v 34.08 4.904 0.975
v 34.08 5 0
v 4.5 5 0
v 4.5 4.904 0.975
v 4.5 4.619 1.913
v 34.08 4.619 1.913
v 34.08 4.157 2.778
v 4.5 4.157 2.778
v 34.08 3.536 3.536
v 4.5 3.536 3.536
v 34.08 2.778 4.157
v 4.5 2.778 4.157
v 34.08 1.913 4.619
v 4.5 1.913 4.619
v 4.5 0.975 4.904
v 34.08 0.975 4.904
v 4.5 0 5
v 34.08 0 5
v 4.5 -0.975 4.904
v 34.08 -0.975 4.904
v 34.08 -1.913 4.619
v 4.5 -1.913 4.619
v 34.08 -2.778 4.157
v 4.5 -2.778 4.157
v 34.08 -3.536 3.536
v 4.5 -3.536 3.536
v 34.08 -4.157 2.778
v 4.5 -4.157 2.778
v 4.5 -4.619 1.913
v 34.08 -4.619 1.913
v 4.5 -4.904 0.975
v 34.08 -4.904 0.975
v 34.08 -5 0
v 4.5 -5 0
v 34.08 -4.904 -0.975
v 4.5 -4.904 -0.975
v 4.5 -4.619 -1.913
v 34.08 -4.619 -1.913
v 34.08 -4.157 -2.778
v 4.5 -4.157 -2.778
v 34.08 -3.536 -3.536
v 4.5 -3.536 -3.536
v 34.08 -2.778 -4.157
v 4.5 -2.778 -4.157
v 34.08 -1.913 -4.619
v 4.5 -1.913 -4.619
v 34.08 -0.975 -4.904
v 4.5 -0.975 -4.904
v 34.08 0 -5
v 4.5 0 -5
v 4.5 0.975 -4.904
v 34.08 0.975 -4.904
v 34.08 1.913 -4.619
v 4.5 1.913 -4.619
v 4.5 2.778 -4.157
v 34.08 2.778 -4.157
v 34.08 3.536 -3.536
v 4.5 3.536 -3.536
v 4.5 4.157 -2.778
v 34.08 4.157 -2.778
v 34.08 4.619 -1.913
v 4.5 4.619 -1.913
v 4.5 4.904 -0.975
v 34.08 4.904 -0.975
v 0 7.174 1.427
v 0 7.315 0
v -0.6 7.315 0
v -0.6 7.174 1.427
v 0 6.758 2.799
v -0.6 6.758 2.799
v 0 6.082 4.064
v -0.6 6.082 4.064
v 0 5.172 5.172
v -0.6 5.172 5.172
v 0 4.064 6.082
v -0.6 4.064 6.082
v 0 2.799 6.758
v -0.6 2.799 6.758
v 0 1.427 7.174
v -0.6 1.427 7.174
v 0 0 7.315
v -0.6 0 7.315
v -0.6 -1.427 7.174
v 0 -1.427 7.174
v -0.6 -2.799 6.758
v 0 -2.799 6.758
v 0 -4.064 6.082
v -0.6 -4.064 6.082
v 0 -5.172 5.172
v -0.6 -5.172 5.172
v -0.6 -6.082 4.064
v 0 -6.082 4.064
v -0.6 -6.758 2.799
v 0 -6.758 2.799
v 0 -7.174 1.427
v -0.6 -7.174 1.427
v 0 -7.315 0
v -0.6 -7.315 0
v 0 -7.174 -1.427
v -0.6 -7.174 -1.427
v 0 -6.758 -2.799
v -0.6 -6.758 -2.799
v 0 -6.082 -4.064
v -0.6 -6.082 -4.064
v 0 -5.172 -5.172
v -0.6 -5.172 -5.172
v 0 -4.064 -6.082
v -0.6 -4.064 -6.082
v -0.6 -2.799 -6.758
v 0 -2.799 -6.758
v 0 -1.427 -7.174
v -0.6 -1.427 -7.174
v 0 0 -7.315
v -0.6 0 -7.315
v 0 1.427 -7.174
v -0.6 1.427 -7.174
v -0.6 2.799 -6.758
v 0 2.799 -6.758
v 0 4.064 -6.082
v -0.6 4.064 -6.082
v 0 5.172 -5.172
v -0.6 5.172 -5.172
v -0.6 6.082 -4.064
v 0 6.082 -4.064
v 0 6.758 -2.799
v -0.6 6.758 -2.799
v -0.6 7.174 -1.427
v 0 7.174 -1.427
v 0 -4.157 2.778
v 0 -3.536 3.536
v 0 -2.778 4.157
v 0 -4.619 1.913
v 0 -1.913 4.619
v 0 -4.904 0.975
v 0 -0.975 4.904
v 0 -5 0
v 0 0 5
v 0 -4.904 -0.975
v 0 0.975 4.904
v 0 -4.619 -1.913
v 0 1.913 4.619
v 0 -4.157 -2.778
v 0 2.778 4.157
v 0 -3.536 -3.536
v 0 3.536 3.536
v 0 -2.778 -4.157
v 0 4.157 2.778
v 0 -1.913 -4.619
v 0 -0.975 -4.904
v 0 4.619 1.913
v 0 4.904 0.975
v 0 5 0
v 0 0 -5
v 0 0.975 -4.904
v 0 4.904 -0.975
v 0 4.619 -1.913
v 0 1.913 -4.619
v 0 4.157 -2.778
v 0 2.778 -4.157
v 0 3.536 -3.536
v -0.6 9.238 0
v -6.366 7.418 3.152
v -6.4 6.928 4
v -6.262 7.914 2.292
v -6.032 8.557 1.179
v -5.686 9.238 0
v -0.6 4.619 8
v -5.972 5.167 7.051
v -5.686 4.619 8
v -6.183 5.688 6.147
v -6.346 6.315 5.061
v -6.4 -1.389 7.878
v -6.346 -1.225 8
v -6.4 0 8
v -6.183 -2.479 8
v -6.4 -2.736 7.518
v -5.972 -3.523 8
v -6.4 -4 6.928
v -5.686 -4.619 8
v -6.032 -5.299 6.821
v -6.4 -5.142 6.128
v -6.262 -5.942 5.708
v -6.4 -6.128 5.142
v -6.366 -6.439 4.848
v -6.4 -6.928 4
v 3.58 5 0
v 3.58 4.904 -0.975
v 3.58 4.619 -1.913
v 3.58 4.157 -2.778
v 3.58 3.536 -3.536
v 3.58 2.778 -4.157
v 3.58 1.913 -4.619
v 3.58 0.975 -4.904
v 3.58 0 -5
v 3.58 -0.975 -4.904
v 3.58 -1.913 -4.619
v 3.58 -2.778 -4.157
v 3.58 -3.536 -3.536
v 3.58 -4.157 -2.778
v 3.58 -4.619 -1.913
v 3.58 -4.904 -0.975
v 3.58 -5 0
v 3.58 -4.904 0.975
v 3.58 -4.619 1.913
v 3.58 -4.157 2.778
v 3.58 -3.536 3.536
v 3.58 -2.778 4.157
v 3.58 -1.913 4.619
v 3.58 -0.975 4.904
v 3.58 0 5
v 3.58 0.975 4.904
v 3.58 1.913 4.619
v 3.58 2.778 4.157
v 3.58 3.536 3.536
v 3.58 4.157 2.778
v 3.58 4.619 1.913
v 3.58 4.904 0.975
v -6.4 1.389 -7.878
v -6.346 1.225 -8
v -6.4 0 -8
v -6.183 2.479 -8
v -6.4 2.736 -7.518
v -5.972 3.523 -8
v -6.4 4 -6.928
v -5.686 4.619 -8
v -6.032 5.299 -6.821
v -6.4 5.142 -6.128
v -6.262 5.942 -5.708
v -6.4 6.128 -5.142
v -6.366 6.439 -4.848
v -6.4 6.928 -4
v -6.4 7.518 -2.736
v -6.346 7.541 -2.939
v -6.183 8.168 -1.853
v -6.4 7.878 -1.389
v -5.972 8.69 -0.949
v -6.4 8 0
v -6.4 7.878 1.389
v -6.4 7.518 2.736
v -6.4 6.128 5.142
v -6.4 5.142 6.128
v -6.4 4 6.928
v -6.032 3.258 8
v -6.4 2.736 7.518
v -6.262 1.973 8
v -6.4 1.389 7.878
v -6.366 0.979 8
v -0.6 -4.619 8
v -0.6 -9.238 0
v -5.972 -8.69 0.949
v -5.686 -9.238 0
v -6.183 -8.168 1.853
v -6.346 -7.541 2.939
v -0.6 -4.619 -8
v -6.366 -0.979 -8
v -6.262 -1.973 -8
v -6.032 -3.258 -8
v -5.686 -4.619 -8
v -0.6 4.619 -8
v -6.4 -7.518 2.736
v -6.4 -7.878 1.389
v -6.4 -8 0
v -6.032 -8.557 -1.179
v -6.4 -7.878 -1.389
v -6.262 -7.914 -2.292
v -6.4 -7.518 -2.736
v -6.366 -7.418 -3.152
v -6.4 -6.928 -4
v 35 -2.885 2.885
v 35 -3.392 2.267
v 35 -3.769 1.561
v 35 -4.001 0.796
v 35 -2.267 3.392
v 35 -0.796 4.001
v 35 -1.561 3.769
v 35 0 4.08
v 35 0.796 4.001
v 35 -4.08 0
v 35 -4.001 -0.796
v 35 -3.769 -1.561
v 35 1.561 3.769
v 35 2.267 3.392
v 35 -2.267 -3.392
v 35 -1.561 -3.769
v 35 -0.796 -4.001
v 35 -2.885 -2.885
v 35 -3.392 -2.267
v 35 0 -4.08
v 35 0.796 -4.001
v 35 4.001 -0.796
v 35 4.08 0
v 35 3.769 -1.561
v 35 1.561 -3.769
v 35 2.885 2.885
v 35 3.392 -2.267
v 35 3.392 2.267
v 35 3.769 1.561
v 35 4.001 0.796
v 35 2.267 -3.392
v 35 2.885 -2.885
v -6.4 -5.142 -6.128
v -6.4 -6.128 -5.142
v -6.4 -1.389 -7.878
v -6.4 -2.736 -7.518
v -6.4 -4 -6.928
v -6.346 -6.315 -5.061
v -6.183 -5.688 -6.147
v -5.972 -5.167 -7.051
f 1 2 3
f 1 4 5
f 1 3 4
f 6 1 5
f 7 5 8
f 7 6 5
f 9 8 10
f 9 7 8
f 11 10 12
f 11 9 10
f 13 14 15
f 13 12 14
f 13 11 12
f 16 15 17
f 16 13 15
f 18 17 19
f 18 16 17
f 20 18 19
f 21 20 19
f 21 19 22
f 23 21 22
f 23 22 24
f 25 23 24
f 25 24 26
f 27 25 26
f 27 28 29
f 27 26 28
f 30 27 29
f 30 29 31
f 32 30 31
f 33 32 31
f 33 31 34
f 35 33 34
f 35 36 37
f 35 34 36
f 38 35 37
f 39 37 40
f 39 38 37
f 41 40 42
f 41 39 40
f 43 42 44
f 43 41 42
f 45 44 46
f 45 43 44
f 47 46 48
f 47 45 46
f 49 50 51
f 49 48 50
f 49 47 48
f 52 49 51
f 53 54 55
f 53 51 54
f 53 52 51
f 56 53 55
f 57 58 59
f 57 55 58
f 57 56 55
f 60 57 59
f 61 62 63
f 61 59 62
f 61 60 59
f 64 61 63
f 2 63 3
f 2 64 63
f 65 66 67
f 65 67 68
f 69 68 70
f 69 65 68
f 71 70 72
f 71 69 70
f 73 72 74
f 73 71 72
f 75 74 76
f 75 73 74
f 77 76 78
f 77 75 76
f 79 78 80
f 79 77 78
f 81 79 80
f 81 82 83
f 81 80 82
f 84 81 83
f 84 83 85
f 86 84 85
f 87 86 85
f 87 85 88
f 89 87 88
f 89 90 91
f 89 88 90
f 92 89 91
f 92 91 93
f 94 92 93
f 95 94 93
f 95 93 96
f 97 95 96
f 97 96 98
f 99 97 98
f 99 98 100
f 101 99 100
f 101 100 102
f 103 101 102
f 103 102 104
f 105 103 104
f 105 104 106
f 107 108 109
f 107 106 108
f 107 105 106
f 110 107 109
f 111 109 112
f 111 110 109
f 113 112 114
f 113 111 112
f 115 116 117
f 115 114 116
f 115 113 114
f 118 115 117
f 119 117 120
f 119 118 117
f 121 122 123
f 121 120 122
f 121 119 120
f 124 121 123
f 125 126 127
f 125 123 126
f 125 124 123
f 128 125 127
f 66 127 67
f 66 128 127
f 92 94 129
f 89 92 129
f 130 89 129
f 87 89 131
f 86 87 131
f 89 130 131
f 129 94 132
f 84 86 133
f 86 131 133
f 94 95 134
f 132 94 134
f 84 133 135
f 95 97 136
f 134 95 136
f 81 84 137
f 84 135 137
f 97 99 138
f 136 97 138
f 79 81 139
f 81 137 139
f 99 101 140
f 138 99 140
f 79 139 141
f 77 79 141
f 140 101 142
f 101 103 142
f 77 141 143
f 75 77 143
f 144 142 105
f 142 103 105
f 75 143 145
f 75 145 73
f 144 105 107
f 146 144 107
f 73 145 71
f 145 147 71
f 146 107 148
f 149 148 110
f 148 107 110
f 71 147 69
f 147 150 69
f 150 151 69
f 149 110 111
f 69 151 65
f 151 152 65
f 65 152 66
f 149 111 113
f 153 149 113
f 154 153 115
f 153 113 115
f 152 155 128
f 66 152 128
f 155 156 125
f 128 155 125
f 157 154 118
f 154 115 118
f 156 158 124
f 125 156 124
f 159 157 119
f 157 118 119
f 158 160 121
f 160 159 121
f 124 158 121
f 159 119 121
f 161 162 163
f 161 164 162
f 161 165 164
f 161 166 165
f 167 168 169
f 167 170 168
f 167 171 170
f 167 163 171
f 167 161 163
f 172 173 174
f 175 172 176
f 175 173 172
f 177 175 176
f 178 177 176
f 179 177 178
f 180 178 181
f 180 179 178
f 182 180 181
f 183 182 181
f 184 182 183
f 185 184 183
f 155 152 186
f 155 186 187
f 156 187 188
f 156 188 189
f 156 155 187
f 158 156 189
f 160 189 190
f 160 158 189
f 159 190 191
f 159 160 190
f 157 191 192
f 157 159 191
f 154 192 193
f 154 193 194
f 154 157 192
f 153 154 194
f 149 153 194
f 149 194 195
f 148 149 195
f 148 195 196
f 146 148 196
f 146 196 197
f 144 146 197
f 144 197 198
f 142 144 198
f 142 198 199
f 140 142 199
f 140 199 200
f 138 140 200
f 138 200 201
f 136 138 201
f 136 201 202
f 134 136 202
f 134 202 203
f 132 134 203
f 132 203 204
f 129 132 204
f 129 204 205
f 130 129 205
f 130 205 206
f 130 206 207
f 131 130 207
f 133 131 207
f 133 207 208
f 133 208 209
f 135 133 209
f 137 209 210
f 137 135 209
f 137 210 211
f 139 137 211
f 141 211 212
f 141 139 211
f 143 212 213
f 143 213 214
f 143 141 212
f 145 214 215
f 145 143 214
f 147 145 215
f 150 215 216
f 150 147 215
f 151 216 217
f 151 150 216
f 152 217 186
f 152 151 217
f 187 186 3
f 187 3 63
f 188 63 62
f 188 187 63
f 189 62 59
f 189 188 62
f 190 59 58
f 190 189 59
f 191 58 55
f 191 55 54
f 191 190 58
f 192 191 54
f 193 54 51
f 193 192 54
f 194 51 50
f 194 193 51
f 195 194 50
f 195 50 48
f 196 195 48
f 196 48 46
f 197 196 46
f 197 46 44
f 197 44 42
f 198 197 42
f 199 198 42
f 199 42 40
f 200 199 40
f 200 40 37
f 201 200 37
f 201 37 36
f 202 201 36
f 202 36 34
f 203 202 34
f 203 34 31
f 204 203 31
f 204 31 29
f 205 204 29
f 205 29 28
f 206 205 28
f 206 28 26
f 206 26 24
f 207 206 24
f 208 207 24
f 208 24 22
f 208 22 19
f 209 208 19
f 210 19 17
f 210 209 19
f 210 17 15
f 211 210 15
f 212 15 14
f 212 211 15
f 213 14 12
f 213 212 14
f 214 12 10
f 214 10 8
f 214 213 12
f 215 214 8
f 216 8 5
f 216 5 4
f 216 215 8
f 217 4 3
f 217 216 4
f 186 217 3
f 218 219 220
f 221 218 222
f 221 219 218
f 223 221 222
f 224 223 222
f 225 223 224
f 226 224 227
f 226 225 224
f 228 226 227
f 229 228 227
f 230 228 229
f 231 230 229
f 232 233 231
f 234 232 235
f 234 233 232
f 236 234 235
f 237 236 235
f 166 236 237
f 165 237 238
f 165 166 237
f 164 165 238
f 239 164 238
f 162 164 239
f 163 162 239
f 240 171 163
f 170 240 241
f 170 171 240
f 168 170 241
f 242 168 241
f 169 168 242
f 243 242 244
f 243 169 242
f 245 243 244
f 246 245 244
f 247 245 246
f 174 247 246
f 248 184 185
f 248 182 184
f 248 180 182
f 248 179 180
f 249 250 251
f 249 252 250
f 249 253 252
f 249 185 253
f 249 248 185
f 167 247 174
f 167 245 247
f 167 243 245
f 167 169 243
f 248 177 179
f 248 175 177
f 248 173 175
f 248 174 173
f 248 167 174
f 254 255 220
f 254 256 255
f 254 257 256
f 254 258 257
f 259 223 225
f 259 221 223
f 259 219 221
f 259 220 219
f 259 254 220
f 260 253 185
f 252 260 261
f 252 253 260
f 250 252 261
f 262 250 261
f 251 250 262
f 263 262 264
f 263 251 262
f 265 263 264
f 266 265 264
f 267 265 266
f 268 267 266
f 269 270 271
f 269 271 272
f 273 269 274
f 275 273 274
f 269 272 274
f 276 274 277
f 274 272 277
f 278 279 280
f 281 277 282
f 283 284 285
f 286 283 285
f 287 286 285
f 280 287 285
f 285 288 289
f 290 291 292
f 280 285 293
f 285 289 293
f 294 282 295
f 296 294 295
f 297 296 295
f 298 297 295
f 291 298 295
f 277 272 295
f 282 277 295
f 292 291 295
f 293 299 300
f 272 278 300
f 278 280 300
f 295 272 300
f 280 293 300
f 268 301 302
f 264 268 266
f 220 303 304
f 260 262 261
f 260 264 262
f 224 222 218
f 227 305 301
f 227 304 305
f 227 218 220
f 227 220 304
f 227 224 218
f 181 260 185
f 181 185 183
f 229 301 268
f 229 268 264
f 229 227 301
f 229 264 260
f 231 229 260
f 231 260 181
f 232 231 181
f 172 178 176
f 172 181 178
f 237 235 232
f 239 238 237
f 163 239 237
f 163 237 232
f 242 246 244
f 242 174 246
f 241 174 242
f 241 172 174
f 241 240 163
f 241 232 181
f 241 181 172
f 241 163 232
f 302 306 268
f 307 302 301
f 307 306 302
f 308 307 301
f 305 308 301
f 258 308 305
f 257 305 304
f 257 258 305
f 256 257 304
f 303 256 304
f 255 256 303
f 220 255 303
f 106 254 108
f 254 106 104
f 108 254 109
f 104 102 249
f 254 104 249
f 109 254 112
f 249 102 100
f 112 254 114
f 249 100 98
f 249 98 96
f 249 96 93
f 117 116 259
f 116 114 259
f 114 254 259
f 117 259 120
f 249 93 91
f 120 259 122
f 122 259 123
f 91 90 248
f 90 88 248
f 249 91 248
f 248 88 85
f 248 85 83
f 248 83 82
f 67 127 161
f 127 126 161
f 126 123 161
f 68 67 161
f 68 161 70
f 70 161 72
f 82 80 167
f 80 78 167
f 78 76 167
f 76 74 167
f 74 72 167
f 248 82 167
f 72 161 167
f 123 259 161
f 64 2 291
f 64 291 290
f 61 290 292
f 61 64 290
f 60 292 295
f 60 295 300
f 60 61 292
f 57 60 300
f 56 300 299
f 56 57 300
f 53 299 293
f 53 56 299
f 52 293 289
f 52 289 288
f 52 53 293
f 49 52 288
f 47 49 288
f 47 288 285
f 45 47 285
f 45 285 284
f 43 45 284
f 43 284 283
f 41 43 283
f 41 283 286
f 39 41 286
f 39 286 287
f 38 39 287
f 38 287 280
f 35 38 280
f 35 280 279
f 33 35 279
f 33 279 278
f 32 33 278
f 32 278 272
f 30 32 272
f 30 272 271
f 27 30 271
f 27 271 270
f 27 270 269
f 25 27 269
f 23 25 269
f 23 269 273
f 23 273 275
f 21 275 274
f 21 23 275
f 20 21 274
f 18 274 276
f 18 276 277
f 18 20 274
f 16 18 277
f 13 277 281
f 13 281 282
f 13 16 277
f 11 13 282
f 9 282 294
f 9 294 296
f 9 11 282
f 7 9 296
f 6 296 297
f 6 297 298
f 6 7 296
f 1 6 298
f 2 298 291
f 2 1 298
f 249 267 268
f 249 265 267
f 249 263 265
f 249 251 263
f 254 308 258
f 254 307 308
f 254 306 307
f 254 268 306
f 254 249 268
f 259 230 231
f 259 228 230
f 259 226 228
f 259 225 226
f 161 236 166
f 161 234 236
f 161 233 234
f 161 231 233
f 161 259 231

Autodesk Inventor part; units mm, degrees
ref_plane "YZ Plane" through (0, 0, 0) normal (1, 0, 0) x (0, 1, 0)
ref_plane "XZ Plane" through (0, 0, 0) normal (0, 1, 0) x (-1, 0, 0)
sketch "Sketch1" plane through (0, 0, 0) normal (0, 0, 1) x (1, 0, 0)
  line L0 (0, 7.315) -> (0, 5)
  line L1 (4.5, 5) -> (35, 5)
  line L2 (35, 5) -> (35, 0)
  line L3 (35, 0) -> (-0.6001, 0)
  line L4 (-7.7201, 0) -> (42.12, 0) projected
  line L5 (-0.6001, 0) -> (-0.6001, 7.315)
  line L6 (-0.6001, 7.315) -> (0, 7.315)
  line L7 (4.5, 5) -> (3.5797, 5)
  line L8 (3.5797, 5) -> (0, 5)
  line L9 (0, -1.463) -> (0, 8.778) projected
  dimension "d0" = 35
  dimension "d1" = 30.5
  dimension "d2" = 10
  dimension "d9" = 0.6001
  dimension "d10" = 14.63
  dimension "d13" = 0.9203
  dimension "d14" = 10
revolve "Body" add sketch "Sketch1" angle 360 about axis through (35, 0, 0) along (-1, 0, 0)
sketch "Sketch2" plane through (-0.6001, 0, 0) normal (-1, 0, 0) x (0, 0, 1)
  line L0 (0, 9.2376) -> (8, 4.6188)
  line L1 (8, 4.6188) -> (8, -4.6188)
  line L2 (8, -4.6188) -> (0, -9.2376)
  line L3 (0, -9.2376) -> (-8, -4.6188)
  line L4 (-8, -4.6188) -> (-8, 4.6188)
  line L5 (-8, 4.6188) -> (0, 9.2376)
  point P0 (0, 0)
  point P1 (0, 0)
  dimension "d11" = 16
extrude "Head" add sketch "Sketch2" along normal blind 5.8
sketch "Sketch4" plane through (0, 0, 0) normal (0, 0, 1) x (1, 0, 0)
  line L0 (-6.4001, 8) -> (-6.4001, 9.2376)
  line L1 (-6.4001, 9.2376) -> (-5.6856, 9.2376)
  line L2 (-5.6856, 9.2376) -> (-6.4001, 8)
  line L3 (-7.5601, 0) -> (0.5599, 0) projected
  line L4 (-0.6001, 9.2376) -> (-6.4001, 9.2376) projected
  line L5 (-6.4001, 4.6188) -> (-6.4001, 9.2376) projected
  dimension "d5" = 30
  dimension "d19" = 16
revolve "Chamfer1" cut sketch "Sketch4" angle 360 about axis through (-10, 0, 0) along (1, 0, 0)
thread "Thread" size "M10x1.5" class "6g" standard "ISO Metric profile" length 30.5
chamfer "Chamfer2" distance 0.9202 distance2 0.9203 1 edges at (35, -5, 0) measured on face at (35, -0.8768, 0.3989)
ref_plane "Work Plane1" through (1.525, 0, 0) normal (0, 0, 1) x (1, 0, 0)
equation "\"d11\" = SW"
equation "\"d3\" = KOH - SD"
equation "\"d15\" = GEL"
equation "\"d6\" = -0.5 * SPD + 0.5 * GD"
equation "\"d0\" = NLG"
equation "\"d1\" = GEL"
equation "\"d2\" = GD"
equation "\"d10\" = SD2"
equation "\"d14\" = BDM"
equation "\"d5\" = ANG1"
equation "\"d19\" = SW0"
equation "\"NLG\" = 35"
equation "\"GD\" = NND"
equation "\"BDM\" = NND"
equation "\"KOH\" = 6.4"
equation "\"GEL\" = 30.5"
equation "\"SW\" = 16"
equation "\"SW0\" = SW"
equation "\"SPD\" = NND - 1.2269 * PTC"
equation "\"SD2\" = 14.63"
equation "\"SD\" = 0.6"
equation "\"ANG1\" = 30deg"
equation "\"GAL\" = 0.61345 * PTC"
equation "\"GUL\" = 0.61345 * PTC"
equation "\"RR\" = 0.4"
equation "\"GD1\" = THREADDIA - 1.2269 * PTC"
equation "\"SDH\" = SD2"
equation "\"SDHG\" = 4.5"
equation "\"TOA\" = 30deg"
equation "\"PTC\" = 1.5"
equation "\"E0\" = 18.48"
equation "\"NND\" = 10"
equation "\"THREADDIA\" = 10"
properties part number "ISO 4017 - M10 x 35" material "Steel, Mild"
